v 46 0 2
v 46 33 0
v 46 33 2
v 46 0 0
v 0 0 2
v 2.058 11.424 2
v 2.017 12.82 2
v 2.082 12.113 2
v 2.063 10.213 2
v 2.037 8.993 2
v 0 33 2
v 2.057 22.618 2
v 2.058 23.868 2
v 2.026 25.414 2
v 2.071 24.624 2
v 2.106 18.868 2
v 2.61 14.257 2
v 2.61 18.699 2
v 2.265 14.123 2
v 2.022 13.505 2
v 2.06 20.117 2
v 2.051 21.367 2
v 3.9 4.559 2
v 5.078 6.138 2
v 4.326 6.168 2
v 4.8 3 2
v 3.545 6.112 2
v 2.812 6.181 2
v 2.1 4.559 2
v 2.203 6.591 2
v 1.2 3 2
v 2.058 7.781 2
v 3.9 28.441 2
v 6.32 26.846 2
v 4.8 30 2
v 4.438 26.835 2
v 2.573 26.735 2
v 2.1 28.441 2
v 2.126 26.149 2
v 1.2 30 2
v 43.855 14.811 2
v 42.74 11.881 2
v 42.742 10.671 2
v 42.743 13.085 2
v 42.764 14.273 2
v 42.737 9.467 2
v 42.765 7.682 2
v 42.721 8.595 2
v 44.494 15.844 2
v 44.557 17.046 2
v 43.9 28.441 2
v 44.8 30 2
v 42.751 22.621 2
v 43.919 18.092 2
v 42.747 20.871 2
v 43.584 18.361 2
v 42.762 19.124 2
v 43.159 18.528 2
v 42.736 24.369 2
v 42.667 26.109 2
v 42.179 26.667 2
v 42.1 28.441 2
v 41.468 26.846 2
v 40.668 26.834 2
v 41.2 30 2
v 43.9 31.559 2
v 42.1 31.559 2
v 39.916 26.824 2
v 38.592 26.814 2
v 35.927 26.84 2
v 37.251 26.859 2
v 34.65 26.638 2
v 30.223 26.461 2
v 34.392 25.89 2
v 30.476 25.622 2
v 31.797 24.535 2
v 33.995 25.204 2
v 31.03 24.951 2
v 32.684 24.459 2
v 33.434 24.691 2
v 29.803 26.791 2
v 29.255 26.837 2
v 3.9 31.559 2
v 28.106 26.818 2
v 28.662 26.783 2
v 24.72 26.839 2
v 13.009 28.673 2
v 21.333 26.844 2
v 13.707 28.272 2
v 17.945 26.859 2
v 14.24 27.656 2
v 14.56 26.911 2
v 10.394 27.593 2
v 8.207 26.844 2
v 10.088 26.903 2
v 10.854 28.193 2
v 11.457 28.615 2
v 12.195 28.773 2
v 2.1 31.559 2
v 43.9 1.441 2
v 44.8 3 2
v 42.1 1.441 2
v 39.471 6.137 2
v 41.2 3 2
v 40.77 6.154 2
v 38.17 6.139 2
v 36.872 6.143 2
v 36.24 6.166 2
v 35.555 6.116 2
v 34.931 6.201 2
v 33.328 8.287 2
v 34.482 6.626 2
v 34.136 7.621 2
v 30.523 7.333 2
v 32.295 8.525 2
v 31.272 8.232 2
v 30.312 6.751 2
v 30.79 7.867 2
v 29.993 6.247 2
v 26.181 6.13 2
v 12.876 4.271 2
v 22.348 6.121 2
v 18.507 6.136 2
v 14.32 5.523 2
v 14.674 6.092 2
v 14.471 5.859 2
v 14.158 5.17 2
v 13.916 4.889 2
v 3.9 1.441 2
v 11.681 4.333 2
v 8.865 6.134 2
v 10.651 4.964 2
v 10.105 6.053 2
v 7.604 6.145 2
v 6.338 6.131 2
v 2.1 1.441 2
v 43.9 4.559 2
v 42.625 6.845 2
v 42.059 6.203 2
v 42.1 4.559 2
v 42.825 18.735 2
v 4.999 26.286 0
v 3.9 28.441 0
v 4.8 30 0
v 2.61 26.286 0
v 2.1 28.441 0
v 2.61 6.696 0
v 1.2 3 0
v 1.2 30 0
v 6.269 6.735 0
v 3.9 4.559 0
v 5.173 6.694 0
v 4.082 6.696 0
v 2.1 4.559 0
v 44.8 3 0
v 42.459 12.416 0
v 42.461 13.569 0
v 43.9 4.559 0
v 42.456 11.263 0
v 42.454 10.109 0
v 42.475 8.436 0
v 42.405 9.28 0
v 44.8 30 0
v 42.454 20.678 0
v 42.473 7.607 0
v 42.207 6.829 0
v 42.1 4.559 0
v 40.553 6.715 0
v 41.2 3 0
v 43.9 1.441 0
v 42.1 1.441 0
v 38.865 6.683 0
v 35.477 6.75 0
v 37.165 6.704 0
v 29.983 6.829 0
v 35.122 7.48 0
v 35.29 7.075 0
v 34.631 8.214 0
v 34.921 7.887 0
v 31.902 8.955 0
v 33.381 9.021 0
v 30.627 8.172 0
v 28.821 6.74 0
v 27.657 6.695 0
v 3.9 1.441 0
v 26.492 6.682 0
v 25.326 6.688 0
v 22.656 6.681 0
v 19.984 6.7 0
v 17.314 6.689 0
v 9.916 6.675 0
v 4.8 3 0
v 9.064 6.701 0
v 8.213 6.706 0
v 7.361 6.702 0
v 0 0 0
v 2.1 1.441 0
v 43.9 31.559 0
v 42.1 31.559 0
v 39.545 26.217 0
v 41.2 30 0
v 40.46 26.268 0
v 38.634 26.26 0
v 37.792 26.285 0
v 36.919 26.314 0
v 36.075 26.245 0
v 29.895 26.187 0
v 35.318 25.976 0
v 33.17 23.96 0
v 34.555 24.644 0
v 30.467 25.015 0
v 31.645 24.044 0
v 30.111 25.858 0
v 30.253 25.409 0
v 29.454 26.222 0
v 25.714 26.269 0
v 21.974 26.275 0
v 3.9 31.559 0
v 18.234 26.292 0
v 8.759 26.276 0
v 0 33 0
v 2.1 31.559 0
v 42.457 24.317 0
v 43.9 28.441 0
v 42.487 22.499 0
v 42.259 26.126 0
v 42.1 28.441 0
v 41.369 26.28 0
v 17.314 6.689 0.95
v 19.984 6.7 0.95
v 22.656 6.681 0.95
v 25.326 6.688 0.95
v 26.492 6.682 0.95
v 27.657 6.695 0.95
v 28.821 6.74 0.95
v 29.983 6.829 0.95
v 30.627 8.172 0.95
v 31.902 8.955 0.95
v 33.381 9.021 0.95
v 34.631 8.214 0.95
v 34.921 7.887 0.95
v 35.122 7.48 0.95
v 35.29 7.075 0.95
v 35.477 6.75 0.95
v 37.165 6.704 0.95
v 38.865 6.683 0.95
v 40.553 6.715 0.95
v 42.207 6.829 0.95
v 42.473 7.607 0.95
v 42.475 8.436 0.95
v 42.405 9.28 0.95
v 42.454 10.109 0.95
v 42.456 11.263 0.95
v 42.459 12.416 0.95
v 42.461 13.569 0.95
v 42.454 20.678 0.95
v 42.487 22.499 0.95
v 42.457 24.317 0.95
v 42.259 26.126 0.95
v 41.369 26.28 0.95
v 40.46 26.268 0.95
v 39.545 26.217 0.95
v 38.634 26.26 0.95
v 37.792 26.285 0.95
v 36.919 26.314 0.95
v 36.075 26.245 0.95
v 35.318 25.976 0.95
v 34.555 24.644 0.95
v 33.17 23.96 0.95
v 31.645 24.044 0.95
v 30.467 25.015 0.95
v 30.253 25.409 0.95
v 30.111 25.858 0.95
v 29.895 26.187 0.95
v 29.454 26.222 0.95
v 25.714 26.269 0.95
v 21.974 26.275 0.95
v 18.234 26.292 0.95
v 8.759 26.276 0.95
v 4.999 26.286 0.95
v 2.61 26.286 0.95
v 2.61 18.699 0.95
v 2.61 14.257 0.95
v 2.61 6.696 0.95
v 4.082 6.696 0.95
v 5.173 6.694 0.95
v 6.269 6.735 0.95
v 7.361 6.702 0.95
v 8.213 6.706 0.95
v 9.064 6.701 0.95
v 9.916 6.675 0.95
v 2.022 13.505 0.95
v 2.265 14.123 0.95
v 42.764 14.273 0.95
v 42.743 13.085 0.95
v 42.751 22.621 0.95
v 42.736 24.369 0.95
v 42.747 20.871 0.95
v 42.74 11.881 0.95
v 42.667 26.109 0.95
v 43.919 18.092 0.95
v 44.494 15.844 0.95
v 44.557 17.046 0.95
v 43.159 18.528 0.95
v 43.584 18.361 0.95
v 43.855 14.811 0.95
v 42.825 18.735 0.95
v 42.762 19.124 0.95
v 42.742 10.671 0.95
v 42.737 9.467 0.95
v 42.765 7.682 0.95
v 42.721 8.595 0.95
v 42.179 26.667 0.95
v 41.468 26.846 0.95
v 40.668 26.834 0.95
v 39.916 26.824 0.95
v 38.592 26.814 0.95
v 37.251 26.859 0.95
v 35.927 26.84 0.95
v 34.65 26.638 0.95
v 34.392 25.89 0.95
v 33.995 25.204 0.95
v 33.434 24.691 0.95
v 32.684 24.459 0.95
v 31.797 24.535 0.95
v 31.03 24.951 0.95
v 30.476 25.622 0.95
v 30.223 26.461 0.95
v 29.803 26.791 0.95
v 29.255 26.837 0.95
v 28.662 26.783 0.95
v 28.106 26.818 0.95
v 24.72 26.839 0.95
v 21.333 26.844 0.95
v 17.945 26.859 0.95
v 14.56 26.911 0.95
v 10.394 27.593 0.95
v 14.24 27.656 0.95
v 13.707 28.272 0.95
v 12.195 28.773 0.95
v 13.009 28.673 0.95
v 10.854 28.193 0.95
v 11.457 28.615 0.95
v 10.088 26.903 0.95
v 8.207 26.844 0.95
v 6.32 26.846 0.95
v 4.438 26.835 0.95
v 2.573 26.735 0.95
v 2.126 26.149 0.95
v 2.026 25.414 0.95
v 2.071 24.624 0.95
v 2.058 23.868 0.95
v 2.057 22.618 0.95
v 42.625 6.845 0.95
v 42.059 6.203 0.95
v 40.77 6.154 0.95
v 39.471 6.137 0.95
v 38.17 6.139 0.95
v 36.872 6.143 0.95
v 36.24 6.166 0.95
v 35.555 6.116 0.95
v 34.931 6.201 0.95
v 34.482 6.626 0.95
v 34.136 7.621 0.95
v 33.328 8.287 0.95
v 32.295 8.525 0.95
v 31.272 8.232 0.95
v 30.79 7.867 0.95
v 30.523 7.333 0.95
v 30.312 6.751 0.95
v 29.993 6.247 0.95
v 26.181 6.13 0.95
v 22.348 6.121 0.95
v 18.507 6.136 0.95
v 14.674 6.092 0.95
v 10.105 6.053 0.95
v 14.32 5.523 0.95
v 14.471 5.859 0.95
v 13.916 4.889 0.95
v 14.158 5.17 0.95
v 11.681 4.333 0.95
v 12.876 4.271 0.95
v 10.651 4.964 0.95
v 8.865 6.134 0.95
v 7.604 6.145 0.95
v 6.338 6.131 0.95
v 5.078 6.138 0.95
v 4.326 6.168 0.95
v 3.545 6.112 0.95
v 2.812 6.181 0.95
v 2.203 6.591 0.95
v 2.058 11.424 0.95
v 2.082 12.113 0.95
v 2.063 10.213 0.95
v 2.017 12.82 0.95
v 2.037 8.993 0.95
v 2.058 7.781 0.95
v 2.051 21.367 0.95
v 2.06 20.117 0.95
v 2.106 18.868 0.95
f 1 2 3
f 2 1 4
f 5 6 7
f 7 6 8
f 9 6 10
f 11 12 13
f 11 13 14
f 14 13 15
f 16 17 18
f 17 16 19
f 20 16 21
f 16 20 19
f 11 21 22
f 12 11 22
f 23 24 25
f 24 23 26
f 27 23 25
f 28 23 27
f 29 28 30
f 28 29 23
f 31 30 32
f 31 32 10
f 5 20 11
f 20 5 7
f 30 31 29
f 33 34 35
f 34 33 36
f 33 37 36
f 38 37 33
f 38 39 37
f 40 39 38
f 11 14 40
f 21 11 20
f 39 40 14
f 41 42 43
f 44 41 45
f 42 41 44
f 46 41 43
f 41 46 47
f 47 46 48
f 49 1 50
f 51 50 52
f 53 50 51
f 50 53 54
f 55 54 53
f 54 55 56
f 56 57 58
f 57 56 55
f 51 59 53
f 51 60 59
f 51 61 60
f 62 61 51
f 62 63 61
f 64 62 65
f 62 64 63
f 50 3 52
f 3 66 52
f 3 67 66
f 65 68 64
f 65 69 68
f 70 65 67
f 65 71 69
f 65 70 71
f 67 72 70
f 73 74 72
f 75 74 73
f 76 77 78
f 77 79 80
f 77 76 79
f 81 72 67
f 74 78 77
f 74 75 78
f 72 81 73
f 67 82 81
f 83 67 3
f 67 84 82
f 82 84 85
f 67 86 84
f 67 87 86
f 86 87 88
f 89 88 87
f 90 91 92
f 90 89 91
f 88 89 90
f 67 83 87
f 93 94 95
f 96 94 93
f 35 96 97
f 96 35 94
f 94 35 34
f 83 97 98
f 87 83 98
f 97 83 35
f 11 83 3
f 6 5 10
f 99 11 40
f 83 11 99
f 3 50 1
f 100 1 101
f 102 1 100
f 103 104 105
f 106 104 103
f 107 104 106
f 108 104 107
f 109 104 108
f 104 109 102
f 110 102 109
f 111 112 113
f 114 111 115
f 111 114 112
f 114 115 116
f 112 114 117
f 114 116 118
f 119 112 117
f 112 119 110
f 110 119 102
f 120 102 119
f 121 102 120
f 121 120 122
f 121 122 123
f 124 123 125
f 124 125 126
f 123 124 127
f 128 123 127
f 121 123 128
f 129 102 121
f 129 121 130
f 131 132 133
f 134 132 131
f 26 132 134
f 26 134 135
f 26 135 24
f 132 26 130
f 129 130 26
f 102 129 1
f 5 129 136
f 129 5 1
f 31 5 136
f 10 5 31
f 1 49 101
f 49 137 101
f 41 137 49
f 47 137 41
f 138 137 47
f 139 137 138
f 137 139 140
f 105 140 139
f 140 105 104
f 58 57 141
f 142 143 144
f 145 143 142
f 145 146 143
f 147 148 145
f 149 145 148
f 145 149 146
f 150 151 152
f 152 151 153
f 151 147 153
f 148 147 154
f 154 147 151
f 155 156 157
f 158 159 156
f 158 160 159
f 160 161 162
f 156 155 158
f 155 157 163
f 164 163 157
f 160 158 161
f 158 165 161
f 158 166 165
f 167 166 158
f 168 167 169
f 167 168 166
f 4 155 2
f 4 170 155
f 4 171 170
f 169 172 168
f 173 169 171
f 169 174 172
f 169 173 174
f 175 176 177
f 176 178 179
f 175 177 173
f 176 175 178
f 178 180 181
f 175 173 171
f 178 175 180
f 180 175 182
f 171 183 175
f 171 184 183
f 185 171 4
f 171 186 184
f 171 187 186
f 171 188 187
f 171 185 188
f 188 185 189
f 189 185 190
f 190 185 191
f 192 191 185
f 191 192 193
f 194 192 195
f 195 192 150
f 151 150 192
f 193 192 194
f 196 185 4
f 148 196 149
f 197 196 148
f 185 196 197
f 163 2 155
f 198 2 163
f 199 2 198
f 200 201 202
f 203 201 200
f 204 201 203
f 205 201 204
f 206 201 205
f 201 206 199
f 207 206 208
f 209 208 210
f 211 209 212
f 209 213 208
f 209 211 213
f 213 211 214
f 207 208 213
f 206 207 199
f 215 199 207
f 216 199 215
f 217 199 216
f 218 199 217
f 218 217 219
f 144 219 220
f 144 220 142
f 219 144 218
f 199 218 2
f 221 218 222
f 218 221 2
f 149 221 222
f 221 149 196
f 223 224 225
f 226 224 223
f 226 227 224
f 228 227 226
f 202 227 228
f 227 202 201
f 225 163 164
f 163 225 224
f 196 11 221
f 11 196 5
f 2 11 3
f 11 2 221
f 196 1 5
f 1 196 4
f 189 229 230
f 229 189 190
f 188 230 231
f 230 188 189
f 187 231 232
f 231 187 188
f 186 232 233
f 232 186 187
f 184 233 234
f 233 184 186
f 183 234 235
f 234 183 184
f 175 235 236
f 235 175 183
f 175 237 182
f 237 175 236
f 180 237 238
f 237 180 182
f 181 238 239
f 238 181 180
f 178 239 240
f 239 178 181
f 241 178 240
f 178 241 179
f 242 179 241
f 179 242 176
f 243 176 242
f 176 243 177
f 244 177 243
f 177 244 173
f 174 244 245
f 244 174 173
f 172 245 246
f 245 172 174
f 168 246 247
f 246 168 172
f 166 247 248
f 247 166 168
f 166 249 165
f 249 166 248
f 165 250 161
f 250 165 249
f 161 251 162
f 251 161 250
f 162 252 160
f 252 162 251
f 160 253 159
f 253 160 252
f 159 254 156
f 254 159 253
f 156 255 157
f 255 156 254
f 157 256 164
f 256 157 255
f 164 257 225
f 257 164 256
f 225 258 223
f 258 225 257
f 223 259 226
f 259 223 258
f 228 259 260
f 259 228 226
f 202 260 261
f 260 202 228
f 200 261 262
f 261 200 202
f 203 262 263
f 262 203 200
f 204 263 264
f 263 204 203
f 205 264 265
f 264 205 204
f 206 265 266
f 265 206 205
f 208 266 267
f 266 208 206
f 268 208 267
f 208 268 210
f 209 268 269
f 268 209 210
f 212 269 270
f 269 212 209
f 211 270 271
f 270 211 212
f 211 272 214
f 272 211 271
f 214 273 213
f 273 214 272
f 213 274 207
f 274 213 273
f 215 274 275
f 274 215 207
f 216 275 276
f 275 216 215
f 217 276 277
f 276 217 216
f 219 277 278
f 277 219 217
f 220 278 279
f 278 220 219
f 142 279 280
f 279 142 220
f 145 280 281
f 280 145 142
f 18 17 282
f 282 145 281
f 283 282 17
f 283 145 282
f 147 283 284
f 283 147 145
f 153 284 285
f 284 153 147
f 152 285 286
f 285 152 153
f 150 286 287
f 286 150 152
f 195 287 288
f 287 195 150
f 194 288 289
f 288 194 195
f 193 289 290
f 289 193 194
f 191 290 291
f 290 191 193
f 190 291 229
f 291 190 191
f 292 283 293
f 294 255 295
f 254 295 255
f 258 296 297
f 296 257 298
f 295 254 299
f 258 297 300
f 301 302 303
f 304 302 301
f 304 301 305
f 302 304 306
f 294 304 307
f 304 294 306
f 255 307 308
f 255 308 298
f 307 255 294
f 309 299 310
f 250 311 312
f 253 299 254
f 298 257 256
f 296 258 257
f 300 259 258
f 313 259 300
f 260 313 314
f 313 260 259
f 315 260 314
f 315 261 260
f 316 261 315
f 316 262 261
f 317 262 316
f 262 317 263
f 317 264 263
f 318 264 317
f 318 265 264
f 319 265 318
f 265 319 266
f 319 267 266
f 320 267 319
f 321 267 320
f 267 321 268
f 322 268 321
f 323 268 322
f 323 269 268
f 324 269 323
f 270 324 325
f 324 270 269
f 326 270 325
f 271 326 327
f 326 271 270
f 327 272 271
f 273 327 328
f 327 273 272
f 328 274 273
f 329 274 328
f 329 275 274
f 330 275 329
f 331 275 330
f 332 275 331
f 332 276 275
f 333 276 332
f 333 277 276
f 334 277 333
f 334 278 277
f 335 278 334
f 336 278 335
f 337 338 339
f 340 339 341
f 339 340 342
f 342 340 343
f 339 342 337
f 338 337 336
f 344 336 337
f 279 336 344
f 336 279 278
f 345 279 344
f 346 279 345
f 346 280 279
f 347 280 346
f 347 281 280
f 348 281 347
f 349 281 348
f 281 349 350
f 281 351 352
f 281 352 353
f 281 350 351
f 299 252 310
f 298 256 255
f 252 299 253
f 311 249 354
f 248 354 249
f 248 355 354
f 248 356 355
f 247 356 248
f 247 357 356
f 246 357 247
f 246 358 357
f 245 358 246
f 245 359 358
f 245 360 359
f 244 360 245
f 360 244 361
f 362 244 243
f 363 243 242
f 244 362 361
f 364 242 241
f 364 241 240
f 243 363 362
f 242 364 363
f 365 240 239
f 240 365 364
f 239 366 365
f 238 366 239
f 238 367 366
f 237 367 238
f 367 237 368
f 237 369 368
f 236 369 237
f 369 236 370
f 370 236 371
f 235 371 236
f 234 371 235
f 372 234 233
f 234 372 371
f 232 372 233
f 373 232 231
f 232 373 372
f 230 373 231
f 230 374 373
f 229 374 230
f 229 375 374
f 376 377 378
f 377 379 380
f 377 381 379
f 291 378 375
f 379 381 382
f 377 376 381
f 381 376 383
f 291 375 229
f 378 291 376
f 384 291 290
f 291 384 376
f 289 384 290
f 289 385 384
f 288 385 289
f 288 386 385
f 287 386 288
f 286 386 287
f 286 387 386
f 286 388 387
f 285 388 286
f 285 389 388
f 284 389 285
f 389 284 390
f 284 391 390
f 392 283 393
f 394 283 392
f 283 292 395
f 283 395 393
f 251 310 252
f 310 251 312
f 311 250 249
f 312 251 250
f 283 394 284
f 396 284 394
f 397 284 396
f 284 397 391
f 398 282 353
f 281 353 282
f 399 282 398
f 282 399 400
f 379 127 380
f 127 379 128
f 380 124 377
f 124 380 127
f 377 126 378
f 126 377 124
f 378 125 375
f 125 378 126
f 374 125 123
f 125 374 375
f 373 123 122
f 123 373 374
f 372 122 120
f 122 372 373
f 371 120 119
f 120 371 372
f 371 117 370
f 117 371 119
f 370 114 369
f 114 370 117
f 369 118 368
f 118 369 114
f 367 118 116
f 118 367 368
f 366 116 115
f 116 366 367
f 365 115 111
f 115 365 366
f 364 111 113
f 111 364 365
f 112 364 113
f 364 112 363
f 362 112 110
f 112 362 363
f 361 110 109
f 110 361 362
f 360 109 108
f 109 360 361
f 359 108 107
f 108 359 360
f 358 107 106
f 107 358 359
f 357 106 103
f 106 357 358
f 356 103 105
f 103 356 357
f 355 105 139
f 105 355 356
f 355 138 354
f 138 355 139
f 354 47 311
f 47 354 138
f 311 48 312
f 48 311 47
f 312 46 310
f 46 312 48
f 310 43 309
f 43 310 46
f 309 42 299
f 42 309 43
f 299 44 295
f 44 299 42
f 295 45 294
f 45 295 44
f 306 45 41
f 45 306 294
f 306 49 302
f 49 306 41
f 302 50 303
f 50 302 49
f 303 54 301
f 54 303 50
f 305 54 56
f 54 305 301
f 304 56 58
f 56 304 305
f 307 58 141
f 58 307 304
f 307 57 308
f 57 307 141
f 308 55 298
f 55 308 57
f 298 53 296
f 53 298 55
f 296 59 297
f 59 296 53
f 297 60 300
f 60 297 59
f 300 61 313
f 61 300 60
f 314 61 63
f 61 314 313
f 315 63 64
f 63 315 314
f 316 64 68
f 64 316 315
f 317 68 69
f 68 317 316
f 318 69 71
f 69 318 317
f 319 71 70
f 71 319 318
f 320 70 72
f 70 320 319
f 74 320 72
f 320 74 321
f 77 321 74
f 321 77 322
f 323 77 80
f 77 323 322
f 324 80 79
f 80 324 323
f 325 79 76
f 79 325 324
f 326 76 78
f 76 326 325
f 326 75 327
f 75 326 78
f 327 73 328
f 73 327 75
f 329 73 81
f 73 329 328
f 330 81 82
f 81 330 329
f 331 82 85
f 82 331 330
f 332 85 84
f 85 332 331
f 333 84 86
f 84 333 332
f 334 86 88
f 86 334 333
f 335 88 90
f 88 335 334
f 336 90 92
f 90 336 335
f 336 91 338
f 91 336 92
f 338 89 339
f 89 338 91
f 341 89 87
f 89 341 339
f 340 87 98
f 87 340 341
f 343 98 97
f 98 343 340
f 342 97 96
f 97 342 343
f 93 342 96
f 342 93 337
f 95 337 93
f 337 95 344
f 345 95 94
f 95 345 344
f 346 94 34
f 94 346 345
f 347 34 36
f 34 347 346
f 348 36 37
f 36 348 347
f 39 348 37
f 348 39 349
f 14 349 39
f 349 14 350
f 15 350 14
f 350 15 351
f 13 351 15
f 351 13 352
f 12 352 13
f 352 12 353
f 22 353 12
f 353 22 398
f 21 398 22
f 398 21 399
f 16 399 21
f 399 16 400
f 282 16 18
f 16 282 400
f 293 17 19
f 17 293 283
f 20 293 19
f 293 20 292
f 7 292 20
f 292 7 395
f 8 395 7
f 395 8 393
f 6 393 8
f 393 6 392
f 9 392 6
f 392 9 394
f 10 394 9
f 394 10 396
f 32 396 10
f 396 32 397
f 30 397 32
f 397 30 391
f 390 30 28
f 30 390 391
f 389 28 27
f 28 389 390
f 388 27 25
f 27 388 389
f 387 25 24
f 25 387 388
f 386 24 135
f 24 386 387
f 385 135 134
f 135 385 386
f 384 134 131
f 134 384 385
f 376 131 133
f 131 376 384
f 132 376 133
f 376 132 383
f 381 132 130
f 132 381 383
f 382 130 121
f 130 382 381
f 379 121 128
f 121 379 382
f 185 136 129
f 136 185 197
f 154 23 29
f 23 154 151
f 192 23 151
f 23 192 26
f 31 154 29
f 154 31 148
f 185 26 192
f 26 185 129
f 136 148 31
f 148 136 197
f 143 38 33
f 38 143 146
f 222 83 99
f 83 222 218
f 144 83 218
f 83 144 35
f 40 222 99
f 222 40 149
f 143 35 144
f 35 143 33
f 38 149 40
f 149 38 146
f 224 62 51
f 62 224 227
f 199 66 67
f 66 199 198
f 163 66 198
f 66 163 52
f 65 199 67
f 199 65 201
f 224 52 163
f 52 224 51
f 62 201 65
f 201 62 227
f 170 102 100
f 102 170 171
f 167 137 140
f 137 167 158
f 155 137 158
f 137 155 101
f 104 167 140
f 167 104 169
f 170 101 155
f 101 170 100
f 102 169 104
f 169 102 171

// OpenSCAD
smallnum = 0.05;
bignum = 10;
icanvasx= 42;
icanvasy = 24;
ocanvasx= 42.61;
ocanvasy = 24.56;

boardheight = 1;
holderx=46;
holdery=33;
holderz=2;


difference(){
    cube([holderx,holdery,holderz]);
    translate([ocanvasx-icanvasx+2, (holdery-icanvasy)/2, -smallnum]) linear_extrude(height = bignum)
        import (file = "IMU-InsetDXF.dxf"); 
    translate([2, (holdery-ocanvasy)/2, holderz-boardheight-smallnum]) linear_extrude(height = bignum)import (file = "IMU-OutsetDXF.dxf");
       
    
    translate([3,3,0]) cylinder(r=1.8,h=bignum, center=true);
    translate([3,holdery-3,0]) cylinder(r=1.8,h=bignum, center=true);
    translate([holderx-3,holdery-3,0]) cylinder(r=1.8,h=bignum, center=true);
    translate([holderx-3,3,0]) cylinder(r=1.8,h=bignum, center=true);
}
